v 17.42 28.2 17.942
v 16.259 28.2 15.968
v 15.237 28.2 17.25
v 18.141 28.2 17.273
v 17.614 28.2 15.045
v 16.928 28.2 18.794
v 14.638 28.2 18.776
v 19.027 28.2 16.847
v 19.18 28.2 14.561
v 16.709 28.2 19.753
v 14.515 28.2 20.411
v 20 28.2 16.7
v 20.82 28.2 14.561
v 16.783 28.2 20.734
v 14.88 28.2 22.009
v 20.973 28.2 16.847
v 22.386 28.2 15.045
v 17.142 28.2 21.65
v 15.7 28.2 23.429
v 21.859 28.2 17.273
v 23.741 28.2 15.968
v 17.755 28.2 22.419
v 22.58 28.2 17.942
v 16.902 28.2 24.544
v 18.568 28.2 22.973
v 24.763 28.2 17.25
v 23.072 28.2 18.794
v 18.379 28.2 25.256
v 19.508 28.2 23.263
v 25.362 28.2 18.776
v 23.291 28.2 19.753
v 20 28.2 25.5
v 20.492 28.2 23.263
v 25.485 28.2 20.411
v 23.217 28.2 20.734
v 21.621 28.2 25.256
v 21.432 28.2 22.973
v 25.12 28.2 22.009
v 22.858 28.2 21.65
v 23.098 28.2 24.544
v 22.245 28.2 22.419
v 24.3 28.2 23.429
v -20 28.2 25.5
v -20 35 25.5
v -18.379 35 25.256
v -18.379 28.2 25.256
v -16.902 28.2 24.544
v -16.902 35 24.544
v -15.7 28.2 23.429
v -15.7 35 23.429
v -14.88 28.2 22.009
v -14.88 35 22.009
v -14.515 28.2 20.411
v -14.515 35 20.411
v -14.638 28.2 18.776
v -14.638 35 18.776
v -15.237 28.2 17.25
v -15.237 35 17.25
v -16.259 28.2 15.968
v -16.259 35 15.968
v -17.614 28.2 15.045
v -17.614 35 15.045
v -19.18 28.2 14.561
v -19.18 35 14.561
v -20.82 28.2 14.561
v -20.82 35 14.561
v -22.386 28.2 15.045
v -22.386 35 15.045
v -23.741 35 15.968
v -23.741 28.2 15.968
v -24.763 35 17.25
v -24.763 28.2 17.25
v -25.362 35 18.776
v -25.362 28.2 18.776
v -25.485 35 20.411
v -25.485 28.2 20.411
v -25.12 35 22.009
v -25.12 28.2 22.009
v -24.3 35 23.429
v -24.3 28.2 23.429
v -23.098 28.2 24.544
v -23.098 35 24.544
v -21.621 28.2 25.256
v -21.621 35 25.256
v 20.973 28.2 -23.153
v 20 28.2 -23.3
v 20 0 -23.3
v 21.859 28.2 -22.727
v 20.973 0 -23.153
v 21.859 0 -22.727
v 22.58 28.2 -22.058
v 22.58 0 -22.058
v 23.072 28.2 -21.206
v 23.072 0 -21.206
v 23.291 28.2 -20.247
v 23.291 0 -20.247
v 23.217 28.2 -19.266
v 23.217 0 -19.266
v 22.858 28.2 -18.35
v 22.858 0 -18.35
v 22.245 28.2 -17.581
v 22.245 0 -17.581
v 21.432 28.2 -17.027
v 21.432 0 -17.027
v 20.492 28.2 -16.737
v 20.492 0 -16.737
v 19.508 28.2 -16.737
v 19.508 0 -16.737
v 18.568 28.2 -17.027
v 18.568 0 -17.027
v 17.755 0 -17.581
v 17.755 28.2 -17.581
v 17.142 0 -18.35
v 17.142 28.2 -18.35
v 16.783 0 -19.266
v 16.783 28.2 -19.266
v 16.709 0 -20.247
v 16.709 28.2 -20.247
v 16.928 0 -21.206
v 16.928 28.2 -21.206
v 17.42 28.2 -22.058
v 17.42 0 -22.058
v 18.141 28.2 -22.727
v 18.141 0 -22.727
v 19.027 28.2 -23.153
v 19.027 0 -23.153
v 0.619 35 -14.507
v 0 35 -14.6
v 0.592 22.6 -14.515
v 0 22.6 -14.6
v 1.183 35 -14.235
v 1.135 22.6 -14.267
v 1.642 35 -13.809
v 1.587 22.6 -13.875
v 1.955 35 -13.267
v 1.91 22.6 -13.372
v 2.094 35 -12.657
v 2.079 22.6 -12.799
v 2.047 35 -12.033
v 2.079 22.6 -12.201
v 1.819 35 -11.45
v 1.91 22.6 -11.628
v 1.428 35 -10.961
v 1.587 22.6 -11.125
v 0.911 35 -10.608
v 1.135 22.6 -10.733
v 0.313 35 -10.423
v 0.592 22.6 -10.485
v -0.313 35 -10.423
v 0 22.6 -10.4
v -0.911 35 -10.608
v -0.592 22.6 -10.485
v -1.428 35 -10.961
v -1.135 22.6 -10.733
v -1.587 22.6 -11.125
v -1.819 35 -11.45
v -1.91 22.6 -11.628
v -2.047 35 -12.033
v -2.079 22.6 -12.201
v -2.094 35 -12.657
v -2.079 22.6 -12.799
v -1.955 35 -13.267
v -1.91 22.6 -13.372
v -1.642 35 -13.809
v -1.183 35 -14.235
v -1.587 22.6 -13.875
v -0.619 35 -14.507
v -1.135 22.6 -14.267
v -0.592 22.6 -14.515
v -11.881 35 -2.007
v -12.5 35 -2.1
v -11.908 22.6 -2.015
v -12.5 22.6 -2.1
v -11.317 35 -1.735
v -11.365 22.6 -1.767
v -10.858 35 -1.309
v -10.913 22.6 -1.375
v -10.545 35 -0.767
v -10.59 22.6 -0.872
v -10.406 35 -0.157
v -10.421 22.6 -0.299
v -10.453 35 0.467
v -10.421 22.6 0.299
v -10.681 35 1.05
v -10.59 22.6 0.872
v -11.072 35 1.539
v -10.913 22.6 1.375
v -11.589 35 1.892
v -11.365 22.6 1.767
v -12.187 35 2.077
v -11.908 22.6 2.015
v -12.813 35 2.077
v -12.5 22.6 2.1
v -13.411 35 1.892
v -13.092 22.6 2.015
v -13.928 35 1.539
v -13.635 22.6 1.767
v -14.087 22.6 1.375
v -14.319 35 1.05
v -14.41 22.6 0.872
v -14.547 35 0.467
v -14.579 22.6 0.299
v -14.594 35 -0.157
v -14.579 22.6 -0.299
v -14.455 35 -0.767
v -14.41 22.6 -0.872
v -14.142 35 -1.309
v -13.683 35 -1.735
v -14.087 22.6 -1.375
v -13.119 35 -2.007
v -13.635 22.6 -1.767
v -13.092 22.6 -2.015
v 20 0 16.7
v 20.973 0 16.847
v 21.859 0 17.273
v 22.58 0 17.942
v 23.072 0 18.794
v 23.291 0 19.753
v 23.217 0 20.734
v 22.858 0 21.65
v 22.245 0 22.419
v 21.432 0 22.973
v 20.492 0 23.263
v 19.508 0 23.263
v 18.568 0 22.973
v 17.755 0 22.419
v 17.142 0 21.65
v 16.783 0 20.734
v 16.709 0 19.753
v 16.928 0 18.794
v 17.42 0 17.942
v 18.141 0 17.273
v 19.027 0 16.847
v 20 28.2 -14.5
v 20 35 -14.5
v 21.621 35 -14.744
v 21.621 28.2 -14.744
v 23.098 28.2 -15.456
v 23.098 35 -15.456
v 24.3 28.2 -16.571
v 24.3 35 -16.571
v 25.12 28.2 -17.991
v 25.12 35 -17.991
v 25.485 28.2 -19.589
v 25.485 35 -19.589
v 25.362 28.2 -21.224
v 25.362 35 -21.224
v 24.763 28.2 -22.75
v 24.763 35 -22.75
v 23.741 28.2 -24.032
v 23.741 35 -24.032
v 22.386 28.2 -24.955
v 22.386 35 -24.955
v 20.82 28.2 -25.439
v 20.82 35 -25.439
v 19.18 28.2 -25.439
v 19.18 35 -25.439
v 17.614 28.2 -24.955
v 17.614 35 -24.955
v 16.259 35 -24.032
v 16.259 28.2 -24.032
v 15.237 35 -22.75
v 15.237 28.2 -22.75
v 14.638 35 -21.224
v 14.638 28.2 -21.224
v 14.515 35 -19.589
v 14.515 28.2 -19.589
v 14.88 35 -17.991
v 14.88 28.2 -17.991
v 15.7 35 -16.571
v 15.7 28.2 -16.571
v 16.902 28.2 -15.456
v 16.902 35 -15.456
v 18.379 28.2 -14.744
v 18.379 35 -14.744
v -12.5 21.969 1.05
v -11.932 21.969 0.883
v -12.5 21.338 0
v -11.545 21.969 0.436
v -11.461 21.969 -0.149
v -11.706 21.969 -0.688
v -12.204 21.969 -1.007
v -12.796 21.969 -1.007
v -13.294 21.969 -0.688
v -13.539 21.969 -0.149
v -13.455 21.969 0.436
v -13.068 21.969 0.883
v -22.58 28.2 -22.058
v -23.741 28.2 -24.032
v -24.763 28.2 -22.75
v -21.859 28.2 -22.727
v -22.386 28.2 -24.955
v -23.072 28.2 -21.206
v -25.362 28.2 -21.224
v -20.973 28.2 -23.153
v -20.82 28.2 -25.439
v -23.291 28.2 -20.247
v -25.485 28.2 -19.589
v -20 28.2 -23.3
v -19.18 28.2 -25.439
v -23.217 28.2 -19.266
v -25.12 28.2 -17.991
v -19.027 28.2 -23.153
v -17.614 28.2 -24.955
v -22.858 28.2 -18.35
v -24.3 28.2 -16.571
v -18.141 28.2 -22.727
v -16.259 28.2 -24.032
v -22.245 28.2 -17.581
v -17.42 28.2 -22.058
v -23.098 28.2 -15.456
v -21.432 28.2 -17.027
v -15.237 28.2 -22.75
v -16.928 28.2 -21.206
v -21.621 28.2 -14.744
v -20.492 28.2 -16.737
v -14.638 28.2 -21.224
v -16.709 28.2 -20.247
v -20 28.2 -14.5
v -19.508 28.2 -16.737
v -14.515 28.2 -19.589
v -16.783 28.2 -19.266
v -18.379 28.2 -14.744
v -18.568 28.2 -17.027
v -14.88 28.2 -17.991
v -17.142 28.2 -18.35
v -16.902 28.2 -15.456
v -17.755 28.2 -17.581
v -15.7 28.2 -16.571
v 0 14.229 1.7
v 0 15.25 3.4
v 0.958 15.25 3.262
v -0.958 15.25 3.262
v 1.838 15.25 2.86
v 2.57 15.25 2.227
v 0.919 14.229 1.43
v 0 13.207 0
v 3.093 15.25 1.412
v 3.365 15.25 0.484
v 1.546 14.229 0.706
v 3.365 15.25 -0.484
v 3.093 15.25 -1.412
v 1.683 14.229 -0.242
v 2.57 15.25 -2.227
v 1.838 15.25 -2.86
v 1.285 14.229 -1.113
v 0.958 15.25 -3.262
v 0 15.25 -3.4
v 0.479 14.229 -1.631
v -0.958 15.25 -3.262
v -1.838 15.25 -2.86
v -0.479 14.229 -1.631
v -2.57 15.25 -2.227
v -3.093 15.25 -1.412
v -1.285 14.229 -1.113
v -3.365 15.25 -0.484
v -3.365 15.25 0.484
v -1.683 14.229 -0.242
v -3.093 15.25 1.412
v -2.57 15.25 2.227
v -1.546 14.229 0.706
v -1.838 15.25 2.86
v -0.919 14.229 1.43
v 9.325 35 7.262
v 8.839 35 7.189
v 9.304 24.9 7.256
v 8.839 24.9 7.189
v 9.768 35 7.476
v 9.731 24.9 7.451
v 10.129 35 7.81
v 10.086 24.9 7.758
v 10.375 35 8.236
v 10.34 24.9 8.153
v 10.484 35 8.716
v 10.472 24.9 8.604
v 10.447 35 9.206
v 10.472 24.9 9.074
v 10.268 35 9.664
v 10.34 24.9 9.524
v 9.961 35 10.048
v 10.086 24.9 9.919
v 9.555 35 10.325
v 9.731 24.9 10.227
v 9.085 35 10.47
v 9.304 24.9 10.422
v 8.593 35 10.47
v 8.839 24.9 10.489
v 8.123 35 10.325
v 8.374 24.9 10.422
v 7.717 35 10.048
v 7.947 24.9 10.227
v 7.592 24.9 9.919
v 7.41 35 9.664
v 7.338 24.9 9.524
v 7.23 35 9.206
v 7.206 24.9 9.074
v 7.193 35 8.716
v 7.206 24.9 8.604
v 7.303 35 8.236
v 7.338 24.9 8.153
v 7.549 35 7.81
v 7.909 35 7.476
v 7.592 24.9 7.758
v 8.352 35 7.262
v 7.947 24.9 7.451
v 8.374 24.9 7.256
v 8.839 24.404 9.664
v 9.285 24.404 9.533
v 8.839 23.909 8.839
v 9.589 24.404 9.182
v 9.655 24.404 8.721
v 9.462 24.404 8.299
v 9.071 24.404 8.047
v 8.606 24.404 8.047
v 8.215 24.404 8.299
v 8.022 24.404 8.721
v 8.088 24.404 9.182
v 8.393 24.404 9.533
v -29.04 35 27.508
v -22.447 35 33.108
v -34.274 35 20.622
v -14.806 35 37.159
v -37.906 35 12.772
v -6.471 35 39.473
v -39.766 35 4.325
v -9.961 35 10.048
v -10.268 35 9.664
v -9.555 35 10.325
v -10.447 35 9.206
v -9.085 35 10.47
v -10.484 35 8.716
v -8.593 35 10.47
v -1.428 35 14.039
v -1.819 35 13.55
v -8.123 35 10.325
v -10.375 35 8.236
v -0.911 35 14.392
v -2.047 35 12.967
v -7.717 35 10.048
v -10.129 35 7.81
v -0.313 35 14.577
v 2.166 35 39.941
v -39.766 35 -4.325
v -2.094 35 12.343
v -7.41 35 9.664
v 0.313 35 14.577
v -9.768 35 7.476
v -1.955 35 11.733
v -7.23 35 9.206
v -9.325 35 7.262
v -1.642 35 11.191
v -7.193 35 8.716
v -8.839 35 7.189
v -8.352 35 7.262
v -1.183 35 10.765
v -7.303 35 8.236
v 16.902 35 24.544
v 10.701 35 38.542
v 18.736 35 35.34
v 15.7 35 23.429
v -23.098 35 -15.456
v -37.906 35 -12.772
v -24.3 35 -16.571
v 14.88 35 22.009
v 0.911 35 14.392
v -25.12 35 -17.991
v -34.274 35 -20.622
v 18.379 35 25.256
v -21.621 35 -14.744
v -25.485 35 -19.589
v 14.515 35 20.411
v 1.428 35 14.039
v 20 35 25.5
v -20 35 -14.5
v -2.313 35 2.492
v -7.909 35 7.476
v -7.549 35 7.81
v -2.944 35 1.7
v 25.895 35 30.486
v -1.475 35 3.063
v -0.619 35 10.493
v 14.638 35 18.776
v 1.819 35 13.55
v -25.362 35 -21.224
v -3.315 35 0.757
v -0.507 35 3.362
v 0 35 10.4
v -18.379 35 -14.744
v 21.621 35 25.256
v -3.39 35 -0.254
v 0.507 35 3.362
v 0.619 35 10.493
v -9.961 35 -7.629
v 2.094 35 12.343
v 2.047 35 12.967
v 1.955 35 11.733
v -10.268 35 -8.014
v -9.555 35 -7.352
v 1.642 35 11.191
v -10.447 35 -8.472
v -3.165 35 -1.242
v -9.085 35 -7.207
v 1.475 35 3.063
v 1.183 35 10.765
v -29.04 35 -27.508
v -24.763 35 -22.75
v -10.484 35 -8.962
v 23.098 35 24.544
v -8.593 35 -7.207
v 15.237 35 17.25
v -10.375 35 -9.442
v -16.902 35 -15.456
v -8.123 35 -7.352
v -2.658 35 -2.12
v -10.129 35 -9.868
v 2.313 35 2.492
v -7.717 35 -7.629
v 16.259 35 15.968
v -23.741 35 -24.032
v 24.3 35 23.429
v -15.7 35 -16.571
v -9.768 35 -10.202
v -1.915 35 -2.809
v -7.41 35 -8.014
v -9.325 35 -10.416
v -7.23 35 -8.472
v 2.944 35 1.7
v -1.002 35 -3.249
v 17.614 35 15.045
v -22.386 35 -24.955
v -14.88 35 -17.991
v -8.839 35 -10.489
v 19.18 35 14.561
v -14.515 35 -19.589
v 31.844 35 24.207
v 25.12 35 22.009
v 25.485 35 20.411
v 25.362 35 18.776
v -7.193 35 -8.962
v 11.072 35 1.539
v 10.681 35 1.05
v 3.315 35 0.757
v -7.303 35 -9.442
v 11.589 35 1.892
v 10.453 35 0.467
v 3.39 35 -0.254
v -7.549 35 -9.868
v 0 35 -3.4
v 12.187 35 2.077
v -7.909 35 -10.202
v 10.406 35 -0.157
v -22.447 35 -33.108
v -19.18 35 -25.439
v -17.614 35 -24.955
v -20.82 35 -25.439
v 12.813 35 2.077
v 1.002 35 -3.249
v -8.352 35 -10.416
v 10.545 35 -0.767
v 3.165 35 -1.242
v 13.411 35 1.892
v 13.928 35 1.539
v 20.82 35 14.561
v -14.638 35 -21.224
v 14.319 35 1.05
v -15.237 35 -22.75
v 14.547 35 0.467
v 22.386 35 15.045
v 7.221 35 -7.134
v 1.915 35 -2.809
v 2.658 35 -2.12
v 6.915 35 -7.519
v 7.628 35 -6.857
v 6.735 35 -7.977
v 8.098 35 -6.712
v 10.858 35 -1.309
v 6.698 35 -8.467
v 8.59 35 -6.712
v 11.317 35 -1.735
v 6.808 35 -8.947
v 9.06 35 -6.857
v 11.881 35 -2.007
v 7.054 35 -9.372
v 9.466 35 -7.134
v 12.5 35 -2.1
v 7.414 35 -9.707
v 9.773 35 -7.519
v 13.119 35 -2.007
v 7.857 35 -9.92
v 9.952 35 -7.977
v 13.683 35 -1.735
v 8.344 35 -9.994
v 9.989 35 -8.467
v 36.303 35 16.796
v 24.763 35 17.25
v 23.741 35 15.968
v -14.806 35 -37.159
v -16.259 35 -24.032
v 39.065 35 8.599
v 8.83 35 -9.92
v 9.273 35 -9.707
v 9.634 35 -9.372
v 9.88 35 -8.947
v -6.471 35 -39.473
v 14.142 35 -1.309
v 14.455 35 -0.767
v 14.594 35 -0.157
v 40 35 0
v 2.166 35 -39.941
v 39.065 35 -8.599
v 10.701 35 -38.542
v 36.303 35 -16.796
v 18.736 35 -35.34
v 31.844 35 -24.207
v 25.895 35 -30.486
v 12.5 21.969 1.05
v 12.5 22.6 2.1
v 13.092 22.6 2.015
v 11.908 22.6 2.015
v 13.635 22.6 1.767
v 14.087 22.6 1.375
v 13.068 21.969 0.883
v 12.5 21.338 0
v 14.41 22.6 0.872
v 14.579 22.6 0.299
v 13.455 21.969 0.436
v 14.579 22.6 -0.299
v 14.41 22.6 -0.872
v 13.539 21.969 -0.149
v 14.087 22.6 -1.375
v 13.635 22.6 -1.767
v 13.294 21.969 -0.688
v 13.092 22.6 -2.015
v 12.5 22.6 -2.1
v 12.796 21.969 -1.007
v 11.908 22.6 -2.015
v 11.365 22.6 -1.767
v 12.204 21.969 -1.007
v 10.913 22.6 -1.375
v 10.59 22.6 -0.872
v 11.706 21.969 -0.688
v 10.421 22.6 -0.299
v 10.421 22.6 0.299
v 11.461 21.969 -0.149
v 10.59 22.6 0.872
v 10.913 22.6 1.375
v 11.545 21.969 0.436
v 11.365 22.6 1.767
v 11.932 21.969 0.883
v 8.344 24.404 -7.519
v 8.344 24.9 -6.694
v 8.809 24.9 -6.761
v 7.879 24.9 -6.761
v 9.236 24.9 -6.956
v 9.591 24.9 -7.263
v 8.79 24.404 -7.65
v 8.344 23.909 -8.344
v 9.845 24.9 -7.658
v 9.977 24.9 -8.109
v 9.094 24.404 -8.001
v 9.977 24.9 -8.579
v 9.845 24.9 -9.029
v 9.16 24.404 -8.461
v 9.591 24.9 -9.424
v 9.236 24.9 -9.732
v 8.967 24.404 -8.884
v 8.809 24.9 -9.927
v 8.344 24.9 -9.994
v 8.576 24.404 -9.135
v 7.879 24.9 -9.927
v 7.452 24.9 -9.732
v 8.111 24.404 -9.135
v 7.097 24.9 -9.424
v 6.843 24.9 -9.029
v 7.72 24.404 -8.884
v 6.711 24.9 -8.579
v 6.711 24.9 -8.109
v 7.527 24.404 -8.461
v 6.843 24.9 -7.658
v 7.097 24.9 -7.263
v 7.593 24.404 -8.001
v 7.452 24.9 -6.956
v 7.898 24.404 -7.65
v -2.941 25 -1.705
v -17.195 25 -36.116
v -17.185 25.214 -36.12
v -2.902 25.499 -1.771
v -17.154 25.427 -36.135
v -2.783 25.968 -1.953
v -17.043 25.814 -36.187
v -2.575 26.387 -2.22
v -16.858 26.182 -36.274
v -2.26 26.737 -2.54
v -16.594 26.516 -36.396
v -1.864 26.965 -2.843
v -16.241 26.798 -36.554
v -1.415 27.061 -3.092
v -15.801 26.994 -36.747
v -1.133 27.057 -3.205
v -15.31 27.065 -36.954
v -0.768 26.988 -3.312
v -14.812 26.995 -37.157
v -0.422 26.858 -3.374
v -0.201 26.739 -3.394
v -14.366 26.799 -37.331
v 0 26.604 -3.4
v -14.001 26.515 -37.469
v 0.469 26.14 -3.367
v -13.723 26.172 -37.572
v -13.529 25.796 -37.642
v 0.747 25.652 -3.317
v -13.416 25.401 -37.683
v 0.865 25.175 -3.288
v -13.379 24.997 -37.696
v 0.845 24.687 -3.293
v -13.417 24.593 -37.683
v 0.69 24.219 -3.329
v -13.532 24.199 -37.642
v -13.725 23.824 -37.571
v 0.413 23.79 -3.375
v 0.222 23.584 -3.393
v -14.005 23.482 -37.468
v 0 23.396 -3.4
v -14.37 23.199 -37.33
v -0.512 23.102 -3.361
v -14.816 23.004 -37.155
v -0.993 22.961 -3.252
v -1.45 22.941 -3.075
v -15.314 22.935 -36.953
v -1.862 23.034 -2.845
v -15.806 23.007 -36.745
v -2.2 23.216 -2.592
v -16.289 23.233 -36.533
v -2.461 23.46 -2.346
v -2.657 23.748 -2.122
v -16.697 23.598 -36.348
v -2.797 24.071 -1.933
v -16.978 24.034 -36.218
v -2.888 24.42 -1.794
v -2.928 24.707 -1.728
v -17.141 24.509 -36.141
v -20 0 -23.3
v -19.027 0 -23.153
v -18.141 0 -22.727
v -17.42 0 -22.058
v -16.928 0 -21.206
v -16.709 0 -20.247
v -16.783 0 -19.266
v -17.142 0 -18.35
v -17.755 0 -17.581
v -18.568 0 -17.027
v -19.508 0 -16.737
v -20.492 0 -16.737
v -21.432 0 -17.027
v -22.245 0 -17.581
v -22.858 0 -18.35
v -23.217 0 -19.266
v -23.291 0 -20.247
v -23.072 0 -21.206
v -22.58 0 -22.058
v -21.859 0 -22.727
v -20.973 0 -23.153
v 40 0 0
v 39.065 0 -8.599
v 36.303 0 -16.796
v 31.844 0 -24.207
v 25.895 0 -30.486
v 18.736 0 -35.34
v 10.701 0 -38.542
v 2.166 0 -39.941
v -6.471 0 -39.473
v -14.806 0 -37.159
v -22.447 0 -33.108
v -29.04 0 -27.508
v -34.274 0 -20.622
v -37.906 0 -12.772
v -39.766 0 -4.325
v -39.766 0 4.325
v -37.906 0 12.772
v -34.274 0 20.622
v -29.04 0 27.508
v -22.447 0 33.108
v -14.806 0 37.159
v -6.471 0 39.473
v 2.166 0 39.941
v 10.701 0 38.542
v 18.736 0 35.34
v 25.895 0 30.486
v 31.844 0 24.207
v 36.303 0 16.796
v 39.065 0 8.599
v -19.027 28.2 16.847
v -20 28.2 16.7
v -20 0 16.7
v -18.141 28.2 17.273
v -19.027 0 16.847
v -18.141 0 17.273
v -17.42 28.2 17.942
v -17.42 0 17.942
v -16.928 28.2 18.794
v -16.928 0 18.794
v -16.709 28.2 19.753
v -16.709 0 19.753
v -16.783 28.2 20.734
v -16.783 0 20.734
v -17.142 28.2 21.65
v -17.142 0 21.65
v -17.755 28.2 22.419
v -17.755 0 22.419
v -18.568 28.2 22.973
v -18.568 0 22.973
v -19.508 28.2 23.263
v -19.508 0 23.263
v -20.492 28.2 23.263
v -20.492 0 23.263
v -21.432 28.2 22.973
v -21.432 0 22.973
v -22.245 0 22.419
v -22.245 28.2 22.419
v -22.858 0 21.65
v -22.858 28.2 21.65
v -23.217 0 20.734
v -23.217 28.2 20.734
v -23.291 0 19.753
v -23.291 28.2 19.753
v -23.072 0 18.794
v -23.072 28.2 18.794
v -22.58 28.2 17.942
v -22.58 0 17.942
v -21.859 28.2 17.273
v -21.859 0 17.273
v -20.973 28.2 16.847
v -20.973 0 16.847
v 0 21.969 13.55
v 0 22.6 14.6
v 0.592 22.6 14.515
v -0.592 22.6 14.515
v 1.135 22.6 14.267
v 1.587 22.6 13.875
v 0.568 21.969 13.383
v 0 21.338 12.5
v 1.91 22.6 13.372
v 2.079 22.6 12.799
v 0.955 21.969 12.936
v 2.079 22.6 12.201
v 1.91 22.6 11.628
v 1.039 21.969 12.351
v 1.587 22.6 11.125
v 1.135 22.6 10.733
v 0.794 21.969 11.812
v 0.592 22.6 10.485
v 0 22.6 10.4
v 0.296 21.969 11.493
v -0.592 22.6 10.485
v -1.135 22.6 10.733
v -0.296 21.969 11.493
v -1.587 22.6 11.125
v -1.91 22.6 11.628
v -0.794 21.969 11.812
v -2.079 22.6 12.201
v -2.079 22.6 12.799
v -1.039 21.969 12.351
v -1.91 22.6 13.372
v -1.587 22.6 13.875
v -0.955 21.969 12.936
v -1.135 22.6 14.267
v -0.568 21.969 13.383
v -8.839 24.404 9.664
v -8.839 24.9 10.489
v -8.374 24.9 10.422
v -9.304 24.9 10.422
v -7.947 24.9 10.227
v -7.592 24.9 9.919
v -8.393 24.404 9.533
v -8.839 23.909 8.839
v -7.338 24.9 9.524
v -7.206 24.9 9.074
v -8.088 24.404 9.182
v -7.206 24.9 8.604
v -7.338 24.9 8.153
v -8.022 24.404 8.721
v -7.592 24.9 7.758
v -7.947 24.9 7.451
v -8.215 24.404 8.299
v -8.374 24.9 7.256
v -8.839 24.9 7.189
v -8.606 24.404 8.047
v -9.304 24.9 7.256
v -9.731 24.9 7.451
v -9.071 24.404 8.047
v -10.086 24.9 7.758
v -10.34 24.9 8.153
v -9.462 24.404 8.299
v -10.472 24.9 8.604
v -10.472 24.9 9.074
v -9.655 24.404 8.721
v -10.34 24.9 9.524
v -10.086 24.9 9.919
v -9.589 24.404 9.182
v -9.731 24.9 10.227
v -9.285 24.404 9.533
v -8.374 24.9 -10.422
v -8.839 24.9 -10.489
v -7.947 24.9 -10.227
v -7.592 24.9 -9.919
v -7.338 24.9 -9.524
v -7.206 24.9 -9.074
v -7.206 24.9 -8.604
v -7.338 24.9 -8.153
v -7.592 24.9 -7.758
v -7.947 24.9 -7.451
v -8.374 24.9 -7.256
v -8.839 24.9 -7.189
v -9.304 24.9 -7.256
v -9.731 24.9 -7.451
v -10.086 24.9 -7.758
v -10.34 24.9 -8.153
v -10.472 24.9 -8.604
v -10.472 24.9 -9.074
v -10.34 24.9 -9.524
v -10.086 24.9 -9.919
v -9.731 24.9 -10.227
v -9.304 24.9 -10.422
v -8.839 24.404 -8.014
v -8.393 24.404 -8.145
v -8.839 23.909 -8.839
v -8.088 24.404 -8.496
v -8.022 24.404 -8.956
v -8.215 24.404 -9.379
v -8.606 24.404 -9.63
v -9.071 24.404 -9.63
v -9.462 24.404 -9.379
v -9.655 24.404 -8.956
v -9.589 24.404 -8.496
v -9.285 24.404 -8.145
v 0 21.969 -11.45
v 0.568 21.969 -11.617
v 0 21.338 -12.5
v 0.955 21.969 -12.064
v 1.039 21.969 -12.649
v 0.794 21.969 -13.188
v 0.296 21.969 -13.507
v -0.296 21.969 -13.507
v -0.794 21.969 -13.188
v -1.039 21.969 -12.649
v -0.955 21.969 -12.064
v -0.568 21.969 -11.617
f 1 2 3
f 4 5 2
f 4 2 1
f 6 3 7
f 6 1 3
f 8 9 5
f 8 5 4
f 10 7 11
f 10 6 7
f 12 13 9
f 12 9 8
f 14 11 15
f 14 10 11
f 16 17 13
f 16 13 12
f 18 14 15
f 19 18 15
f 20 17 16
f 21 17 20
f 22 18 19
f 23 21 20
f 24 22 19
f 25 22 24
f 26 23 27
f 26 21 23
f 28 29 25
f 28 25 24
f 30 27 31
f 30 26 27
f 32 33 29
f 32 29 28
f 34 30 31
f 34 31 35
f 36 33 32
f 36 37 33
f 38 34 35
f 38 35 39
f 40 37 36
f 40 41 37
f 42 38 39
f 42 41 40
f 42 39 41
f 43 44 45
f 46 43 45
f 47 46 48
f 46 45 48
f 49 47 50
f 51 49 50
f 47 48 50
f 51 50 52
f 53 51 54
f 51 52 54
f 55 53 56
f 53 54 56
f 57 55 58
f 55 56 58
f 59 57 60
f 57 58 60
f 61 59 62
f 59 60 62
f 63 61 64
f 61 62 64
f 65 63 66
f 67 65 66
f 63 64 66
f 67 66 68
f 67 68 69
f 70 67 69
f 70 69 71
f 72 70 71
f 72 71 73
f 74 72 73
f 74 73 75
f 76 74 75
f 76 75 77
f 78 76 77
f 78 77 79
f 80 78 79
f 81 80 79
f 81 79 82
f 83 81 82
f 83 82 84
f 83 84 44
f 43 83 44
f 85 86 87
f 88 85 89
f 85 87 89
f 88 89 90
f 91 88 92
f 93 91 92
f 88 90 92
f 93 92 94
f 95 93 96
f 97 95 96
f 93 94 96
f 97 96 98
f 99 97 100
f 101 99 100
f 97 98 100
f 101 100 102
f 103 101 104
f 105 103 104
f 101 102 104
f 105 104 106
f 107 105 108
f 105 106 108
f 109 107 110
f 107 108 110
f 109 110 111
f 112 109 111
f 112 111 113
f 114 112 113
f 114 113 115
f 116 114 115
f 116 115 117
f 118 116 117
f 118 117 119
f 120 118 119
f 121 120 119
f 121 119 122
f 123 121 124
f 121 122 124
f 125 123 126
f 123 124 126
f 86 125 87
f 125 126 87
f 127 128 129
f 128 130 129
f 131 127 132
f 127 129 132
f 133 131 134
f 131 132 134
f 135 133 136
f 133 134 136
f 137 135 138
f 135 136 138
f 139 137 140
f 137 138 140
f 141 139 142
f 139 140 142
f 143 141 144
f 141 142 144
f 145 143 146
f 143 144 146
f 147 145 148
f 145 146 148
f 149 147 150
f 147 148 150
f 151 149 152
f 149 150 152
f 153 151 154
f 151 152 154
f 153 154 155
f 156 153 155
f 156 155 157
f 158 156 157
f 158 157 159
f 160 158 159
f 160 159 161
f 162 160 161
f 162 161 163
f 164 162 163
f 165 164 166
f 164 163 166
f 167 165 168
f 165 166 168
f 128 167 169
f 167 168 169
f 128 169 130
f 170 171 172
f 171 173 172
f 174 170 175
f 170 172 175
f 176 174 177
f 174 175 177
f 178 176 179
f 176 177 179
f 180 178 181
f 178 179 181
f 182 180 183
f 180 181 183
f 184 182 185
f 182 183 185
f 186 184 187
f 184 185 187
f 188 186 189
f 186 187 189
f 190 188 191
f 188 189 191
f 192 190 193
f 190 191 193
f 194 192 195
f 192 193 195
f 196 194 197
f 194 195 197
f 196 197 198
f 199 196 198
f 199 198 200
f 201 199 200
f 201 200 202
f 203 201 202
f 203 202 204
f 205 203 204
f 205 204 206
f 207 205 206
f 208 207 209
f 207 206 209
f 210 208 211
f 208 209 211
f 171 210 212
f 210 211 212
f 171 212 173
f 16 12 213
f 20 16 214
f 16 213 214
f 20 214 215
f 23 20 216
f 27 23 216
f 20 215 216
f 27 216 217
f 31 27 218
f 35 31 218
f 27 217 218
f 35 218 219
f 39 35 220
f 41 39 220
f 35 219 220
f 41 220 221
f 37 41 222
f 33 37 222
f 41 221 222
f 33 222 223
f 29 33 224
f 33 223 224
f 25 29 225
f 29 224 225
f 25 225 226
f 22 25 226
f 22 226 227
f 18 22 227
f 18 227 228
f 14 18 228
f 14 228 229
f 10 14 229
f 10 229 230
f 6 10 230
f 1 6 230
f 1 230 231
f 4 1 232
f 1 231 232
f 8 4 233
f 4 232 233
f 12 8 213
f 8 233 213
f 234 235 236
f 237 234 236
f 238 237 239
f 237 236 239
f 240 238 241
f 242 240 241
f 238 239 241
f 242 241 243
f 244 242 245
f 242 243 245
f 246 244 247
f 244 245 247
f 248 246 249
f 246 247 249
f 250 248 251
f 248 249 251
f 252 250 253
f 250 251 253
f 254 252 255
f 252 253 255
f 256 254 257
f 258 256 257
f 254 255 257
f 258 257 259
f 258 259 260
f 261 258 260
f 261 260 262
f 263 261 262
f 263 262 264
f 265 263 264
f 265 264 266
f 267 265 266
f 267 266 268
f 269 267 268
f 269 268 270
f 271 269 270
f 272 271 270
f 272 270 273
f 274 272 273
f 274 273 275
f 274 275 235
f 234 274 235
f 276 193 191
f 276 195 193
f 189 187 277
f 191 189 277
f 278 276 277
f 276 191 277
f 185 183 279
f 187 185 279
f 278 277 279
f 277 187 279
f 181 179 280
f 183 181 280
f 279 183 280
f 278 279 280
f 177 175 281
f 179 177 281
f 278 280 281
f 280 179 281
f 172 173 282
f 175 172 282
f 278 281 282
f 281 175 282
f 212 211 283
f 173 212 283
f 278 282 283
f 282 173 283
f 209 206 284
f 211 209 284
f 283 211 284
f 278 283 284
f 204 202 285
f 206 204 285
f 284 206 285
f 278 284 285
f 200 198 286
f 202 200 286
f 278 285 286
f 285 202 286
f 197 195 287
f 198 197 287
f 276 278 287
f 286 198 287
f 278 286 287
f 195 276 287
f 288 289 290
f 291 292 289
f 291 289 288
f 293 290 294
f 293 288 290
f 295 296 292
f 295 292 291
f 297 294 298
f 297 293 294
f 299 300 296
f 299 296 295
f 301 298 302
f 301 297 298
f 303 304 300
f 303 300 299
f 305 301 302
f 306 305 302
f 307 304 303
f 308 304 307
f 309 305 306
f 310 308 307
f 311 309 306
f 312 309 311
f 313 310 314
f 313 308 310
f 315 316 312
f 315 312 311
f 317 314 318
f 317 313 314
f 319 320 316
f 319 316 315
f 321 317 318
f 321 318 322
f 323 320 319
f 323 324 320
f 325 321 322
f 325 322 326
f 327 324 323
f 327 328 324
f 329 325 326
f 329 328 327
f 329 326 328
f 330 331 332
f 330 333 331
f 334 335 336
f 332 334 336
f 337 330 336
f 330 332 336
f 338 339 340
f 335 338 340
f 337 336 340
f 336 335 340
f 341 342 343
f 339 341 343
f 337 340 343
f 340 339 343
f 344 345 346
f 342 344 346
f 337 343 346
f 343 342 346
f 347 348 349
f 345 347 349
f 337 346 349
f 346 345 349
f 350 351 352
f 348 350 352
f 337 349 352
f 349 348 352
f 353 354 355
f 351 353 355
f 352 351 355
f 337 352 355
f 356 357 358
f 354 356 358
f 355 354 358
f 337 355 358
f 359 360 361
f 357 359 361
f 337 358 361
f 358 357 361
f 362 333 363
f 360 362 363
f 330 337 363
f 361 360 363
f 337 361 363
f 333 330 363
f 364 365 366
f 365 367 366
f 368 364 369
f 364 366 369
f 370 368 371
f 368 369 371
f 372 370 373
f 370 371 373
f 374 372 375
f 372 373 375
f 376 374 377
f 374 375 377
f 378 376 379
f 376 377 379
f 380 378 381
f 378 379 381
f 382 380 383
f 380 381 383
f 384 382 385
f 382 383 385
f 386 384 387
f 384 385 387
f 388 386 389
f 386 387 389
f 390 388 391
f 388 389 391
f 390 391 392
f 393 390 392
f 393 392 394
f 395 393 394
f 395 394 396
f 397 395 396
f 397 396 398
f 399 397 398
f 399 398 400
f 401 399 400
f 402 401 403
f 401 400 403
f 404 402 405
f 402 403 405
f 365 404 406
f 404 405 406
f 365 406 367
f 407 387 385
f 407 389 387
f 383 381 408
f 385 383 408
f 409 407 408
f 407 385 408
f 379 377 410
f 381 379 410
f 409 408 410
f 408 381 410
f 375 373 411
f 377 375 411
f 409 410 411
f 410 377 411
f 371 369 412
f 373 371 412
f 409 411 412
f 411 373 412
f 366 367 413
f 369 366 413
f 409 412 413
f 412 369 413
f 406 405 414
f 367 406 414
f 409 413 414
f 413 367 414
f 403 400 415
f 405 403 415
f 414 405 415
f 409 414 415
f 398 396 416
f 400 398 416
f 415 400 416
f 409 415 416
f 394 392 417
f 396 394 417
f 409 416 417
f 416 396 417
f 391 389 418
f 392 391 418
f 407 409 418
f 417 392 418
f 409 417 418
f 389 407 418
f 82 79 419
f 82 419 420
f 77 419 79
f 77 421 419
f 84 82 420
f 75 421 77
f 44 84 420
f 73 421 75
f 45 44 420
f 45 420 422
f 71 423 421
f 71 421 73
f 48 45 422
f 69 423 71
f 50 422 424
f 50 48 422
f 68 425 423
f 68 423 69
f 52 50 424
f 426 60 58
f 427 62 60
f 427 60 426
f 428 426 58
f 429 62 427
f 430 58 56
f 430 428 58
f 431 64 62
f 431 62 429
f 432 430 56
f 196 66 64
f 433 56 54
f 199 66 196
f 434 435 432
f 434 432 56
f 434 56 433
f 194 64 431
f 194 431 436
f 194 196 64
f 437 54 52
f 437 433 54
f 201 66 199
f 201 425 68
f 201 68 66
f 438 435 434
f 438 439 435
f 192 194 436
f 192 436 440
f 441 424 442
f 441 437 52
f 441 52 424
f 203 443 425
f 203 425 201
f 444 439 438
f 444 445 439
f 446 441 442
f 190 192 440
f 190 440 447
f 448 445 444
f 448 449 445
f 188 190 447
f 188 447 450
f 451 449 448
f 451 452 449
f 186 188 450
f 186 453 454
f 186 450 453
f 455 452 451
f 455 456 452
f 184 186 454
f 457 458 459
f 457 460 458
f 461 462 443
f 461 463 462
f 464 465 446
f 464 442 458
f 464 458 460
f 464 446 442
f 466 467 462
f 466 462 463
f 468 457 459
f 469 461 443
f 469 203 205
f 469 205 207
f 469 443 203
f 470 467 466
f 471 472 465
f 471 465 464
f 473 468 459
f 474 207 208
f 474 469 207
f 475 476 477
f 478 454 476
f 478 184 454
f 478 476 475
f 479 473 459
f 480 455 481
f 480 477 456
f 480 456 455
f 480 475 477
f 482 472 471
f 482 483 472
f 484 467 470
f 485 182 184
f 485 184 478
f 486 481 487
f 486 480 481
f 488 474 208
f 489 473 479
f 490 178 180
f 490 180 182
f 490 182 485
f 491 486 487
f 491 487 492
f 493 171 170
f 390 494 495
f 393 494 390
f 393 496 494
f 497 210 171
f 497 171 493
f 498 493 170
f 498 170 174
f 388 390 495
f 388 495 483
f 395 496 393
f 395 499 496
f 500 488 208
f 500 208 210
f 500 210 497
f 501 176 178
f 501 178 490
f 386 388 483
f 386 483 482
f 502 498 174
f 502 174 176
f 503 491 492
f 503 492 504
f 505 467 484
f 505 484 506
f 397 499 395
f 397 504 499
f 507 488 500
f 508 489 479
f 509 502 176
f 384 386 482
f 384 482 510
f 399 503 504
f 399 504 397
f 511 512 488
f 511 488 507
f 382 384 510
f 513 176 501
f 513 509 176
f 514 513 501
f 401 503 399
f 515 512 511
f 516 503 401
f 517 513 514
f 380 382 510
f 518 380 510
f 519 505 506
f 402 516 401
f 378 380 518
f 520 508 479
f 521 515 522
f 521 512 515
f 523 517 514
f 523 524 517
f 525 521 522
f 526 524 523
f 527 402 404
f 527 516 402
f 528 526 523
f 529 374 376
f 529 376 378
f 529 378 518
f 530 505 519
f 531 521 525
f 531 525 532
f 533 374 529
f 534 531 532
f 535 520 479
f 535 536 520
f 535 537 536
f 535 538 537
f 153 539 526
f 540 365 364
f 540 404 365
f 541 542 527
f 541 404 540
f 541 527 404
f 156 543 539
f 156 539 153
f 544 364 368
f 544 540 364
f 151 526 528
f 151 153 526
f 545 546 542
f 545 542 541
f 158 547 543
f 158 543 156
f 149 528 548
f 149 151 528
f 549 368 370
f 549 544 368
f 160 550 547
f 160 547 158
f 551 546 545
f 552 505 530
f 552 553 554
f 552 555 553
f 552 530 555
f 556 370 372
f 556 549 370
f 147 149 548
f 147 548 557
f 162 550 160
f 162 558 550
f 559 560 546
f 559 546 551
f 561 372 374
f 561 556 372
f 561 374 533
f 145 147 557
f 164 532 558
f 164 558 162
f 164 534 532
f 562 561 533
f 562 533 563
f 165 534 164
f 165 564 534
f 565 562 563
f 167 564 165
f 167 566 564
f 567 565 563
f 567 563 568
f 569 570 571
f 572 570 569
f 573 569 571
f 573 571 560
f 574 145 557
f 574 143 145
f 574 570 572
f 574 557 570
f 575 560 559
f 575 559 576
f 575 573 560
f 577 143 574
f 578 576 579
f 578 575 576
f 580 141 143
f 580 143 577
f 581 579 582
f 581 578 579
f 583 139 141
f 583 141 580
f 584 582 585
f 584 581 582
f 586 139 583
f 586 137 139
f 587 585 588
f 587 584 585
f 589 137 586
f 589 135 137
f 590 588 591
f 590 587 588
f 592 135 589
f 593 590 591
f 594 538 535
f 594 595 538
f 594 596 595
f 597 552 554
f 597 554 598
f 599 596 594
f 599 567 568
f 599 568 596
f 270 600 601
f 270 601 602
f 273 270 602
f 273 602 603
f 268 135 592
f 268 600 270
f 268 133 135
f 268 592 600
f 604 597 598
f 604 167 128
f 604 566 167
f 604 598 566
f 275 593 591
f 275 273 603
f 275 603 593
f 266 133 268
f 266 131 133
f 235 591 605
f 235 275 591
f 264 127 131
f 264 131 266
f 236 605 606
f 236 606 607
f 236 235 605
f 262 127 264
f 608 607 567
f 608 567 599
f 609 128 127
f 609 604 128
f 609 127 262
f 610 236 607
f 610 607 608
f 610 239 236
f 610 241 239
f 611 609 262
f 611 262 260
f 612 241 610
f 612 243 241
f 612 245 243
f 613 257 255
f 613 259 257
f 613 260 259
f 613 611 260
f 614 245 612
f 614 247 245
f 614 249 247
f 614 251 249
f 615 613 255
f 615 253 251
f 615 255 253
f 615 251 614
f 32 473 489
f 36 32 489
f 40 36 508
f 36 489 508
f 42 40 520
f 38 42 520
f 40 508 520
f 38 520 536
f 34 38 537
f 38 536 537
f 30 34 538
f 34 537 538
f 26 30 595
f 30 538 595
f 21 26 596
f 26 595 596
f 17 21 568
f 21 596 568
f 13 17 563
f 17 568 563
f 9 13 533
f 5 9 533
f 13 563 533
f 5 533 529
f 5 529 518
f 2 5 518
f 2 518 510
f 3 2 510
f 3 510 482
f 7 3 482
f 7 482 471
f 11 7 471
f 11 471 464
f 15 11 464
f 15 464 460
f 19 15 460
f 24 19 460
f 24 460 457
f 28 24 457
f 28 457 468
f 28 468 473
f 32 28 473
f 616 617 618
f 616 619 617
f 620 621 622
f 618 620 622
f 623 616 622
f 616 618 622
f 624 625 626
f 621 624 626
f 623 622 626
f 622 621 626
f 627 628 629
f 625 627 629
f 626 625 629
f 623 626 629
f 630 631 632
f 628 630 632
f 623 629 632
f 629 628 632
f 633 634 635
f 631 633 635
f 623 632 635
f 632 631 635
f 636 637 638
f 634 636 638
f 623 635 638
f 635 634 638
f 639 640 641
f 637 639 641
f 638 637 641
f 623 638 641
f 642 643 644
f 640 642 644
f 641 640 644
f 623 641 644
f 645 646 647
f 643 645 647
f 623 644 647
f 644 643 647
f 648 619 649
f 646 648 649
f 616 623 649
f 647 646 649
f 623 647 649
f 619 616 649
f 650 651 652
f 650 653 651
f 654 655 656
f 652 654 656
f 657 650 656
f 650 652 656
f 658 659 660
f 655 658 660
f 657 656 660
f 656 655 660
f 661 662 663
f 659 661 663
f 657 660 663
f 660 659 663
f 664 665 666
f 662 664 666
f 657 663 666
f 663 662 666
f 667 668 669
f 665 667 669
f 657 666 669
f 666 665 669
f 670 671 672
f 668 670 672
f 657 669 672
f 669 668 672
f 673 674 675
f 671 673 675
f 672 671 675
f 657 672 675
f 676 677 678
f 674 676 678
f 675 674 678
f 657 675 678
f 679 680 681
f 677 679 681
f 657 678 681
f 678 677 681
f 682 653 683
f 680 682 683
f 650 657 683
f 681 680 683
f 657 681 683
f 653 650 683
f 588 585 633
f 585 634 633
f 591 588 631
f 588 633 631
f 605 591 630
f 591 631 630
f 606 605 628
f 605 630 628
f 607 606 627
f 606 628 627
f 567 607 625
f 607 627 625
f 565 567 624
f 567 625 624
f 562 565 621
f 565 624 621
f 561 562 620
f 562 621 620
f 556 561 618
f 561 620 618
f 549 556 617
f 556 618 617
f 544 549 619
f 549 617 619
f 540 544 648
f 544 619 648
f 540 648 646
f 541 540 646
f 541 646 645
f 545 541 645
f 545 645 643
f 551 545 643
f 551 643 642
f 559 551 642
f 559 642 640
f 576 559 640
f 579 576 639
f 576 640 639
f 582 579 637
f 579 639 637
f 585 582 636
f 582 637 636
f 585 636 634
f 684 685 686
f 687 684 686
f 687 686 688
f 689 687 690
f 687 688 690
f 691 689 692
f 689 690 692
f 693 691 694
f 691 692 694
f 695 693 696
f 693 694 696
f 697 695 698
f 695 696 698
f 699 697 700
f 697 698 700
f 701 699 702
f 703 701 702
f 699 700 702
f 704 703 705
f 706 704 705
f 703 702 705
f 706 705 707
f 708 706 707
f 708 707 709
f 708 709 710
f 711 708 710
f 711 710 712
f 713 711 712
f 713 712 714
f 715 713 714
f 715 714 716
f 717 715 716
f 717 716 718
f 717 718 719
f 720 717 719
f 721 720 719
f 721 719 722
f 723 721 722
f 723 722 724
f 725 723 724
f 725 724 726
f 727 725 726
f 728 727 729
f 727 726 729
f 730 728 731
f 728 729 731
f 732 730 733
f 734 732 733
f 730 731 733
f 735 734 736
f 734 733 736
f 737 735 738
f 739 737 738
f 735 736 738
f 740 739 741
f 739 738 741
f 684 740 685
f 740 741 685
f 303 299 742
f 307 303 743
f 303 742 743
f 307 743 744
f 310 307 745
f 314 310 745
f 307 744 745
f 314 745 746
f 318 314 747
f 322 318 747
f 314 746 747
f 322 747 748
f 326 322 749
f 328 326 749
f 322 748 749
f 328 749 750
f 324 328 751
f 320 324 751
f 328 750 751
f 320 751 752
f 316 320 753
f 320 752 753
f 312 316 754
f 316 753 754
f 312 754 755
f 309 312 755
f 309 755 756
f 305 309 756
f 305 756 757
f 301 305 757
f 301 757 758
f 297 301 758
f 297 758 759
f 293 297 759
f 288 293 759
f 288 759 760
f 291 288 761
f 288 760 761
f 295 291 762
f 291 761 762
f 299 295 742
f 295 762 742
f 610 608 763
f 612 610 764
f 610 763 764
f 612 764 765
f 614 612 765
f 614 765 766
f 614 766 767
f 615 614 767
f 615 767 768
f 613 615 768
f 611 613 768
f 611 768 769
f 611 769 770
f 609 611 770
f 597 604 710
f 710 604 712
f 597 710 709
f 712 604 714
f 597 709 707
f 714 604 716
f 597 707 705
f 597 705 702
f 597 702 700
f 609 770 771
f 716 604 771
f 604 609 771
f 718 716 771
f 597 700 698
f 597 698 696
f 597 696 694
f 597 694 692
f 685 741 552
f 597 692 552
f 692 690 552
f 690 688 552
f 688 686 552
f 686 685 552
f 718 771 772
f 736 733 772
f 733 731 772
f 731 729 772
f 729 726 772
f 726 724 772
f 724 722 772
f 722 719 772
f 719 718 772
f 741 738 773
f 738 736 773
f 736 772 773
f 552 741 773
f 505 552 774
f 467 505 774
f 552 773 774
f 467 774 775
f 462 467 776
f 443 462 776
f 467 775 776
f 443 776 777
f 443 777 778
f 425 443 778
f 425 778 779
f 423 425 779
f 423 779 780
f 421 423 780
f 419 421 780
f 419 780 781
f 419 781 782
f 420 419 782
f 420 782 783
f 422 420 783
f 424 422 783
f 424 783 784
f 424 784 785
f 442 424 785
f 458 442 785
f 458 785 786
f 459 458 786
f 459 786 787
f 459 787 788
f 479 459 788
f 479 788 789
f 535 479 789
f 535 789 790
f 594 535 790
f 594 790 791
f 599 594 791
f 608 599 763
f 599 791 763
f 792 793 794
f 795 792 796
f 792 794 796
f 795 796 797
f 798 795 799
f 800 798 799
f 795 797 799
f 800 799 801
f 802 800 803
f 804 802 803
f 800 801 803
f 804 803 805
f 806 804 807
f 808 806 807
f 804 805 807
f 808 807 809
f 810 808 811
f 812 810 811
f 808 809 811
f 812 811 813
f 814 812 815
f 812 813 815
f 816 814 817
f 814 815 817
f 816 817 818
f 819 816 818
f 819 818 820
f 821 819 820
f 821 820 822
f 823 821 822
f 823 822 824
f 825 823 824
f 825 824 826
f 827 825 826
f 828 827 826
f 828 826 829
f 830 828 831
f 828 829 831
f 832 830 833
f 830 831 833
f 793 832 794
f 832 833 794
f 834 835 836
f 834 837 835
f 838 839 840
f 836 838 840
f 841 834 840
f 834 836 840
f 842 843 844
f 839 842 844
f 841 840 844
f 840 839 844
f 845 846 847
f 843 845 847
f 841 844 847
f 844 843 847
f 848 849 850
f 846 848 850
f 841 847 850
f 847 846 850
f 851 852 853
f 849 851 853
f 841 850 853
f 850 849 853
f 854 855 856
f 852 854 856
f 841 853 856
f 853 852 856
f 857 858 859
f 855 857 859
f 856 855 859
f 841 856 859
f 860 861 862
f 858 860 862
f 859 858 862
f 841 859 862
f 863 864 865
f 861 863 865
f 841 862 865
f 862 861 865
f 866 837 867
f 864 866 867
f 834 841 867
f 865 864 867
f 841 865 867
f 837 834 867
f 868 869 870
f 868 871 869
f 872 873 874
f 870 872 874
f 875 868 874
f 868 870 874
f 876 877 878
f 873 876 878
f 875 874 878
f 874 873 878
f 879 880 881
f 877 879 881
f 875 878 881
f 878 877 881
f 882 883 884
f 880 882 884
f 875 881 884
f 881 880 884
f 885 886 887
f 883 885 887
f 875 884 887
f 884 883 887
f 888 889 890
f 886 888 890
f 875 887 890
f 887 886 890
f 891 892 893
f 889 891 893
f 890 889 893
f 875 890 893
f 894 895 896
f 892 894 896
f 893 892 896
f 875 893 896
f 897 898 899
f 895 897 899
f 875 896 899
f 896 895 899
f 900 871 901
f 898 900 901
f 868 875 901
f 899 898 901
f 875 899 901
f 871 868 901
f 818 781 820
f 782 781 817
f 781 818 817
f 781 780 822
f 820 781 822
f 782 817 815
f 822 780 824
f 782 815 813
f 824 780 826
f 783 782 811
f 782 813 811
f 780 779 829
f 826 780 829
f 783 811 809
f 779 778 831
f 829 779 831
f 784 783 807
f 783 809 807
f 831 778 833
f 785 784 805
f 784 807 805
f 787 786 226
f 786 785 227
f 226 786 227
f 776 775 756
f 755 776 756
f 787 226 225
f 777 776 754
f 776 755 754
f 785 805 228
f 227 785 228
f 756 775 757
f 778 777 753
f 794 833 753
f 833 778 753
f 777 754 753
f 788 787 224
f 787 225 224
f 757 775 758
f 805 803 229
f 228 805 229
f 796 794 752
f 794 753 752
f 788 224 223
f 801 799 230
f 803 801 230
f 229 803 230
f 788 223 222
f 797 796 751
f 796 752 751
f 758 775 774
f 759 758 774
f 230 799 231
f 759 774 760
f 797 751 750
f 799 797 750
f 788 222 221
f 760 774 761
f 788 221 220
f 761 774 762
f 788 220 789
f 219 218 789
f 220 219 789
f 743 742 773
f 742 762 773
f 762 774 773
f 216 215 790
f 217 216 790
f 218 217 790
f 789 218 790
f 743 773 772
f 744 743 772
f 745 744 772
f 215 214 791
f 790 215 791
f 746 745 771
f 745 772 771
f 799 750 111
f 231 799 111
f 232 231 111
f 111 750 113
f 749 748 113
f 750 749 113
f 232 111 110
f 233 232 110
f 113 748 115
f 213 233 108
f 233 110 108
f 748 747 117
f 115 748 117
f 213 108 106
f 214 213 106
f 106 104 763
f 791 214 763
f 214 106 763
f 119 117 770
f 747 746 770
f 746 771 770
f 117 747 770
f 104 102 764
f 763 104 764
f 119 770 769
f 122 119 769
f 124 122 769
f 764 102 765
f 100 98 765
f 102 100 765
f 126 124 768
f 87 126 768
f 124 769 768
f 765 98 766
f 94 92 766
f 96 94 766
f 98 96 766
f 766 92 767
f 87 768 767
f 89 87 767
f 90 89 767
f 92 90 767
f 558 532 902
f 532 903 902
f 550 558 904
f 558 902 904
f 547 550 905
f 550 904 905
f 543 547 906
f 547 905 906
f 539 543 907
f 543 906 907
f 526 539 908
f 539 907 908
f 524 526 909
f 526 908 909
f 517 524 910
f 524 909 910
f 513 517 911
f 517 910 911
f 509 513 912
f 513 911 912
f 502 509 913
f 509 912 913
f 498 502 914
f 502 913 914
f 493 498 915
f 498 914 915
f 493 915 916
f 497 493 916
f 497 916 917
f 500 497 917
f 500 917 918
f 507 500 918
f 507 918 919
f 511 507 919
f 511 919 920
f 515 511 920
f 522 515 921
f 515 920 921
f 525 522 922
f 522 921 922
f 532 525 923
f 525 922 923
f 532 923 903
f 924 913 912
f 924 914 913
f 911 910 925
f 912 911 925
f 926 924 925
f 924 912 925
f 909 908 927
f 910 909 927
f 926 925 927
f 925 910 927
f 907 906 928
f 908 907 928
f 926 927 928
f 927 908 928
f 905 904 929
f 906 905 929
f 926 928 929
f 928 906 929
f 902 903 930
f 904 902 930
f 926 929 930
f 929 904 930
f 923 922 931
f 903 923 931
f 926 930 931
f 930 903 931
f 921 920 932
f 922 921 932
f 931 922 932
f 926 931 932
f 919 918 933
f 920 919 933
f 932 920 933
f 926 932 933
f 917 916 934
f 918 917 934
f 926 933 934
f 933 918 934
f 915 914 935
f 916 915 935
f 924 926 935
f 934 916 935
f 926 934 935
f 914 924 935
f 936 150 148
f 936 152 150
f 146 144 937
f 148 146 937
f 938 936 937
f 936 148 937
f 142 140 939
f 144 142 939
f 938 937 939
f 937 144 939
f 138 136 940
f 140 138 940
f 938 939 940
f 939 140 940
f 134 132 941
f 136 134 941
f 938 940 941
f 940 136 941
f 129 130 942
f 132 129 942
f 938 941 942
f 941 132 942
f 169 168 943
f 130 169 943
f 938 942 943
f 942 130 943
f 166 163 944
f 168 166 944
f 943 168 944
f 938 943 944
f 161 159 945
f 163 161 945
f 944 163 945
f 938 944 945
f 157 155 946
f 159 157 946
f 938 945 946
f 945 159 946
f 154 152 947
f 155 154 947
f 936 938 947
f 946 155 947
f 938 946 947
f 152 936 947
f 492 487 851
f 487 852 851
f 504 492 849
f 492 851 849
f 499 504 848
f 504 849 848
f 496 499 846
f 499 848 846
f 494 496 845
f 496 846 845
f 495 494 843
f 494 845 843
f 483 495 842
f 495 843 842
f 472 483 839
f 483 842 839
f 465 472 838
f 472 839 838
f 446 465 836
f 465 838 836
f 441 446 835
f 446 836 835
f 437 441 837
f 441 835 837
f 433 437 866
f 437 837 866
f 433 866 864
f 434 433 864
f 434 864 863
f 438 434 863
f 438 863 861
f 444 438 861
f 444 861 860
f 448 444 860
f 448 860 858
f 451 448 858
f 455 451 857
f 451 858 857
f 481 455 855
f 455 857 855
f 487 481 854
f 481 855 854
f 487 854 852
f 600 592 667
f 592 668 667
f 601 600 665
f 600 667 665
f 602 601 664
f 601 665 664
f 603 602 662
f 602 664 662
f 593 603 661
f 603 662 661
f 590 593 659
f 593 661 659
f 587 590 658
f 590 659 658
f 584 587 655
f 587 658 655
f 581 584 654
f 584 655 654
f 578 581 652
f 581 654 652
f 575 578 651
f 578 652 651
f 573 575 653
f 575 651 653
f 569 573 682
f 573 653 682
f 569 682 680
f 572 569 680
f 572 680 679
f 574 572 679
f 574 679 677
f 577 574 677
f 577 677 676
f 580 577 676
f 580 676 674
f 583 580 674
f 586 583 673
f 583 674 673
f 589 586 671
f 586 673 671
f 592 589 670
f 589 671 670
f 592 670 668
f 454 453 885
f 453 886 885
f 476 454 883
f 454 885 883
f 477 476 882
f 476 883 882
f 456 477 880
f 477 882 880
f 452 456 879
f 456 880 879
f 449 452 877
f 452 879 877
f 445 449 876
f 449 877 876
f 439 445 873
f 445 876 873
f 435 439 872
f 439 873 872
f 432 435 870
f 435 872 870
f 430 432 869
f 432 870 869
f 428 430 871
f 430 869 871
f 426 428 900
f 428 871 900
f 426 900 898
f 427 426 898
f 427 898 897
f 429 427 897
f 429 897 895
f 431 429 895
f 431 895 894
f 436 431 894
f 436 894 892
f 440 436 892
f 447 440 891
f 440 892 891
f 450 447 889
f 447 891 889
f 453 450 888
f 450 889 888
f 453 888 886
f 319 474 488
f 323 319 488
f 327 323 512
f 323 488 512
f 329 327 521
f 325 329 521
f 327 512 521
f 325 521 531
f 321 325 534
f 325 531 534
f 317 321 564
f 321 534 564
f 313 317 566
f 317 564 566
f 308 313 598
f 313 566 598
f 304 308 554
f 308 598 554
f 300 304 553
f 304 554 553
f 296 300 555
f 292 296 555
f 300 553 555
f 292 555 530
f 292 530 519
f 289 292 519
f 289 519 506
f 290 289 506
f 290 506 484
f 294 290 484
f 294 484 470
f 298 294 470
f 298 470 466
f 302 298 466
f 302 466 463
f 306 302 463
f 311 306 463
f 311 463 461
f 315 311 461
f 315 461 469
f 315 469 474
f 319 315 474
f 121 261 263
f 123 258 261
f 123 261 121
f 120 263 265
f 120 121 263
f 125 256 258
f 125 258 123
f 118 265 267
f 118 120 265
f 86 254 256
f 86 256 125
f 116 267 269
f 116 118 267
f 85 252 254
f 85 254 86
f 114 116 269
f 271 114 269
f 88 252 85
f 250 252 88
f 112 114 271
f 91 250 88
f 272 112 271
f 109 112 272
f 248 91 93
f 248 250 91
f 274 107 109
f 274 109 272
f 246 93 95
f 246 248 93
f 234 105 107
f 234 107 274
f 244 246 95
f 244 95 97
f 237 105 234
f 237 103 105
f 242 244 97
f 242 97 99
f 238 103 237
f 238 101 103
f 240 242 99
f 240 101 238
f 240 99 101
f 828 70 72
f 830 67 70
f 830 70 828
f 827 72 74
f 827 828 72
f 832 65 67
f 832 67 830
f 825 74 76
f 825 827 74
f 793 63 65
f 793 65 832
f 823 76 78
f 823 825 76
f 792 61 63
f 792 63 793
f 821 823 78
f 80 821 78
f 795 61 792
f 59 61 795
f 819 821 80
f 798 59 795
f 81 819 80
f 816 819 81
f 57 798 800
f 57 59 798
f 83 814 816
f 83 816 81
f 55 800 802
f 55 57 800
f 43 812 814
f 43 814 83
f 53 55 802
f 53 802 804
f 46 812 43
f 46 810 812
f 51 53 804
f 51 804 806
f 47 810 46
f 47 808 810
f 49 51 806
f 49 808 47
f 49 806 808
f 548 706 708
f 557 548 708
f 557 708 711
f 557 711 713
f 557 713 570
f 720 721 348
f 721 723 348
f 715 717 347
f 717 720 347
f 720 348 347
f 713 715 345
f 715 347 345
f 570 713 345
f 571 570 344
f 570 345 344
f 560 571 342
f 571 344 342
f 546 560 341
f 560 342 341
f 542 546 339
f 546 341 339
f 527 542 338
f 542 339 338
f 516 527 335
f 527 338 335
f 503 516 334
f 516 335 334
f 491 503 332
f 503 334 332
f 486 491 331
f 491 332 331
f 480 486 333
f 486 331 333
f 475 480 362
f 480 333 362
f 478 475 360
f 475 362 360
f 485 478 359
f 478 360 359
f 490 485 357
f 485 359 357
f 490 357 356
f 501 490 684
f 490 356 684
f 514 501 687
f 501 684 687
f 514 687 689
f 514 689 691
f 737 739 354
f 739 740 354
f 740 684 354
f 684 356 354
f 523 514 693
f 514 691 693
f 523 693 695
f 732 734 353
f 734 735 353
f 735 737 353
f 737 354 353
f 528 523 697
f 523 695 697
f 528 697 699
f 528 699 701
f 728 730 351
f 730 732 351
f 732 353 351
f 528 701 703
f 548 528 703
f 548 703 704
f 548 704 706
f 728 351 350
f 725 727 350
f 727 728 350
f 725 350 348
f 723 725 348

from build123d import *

# Parameters (mm, degrees)
SKETCH_1_R                = 40
EXTRUDE_1_DEPTH           = 35
HOLE_WIZARD_1_D           = 6.6
HOLE_WIZARD_1_DEPTH       = 50
HOLE_WIZARD_1_CBORE_D     = 11
HOLE_WIZARD_1_CBORE_DEPTH = 6.8
HOLE_WIZARD_1_TIP         = 1.982840043
HOLE_WIZARD_M5_1_D        = 4.2
HOLE_WIZARD_M5_1_DEPTH    = 12.4
HOLE_WIZARD_M5_1_TIP      = 1.2618073
HOLE_WIZARD_M4_1_D        = 3.3
HOLE_WIZARD_M4_1_DEPTH    = 10.1
HOLE_WIZARD_M4_1_TIP      = 0.991420021
HOLE_WIZARD_M8_1_D        = 6.8
HOLE_WIZARD_M8_1_DEPTH    = 19.75
HOLE_WIZARD_M8_1_TIP      = 2.042926105
SKETCH_7_R                = 2.065
CUT_EXTRUDE_1_DEPTH       = 40


with BuildPart() as part:
    # 草图1 → 凸台-拉伸1 (new body)
    with BuildSketch(Plane(origin=(0, 0, 0), x_dir=(1, 0, 0), z_dir=(0, 1, 0))):
        Circle(SKETCH_1_R)
    extrude(amount=EXTRUDE_1_DEPTH)

    # 打孔尺寸(%根据)内六角圆柱头螺钉的类型1
    with Locations(Plane(origin=(-20, 35, -20), x_dir=(0, 0, 1), z_dir=(0, 1, 0))):
        with Locations((0, 0), (0, 40), (40, 40), (40, 0)):
            CounterBoreHole(HOLE_WIZARD_1_D / 2, HOLE_WIZARD_1_CBORE_D / 2, HOLE_WIZARD_1_CBORE_DEPTH, depth=HOLE_WIZARD_1_DEPTH)
            with Locations((0, 0, -(HOLE_WIZARD_1_DEPTH + HOLE_WIZARD_1_TIP / 2))):  # 118° drill point
                Cone(0, HOLE_WIZARD_1_D / 2, HOLE_WIZARD_1_TIP, mode=Mode.SUBTRACT)

    # M5 螺纹孔1
    with Locations(Plane(origin=(0, 35, -12.5), x_dir=(0, 0, 1), z_dir=(0, 1, 0))):
        with Locations((0, 0), (25, 0), (12.5, 12.5), (12.5, -12.5)):
            Hole(HOLE_WIZARD_M5_1_D / 2, depth=HOLE_WIZARD_M5_1_DEPTH)
            with Locations((0, 0, -(HOLE_WIZARD_M5_1_DEPTH + HOLE_WIZARD_M5_1_TIP / 2))):  # 118° drill point
                Cone(0, HOLE_WIZARD_M5_1_D / 2, HOLE_WIZARD_M5_1_TIP, mode=Mode.SUBTRACT)

    # M4 螺纹孔1
    with Locations(Plane(origin=(-8.838834765, 35, -8.838834765), x_dir=(0, 0, 1), z_dir=(0, 1, 0))):
        with Locations((0, 0), (0.495114697, 17.182554833), (17.67766953, 17.67766953), (17.67766953, 0)):
            Hole(HOLE_WIZARD_M4_1_D / 2, depth=HOLE_WIZARD_M4_1_DEPTH)
            with Locations((0, 0, -(HOLE_WIZARD_M4_1_DEPTH + HOLE_WIZARD_M4_1_TIP / 2))):  # 118° drill point
                Cone(0, HOLE_WIZARD_M4_1_D / 2, HOLE_WIZARD_M4_1_TIP, mode=Mode.SUBTRACT)

    # M8 螺纹孔1
    with Locations(Plane.ZX.offset(35)):
        with Locations((0, 0)):
            Hole(HOLE_WIZARD_M8_1_D / 2, depth=HOLE_WIZARD_M8_1_DEPTH)
            with Locations((0, 0, -(HOLE_WIZARD_M8_1_DEPTH + HOLE_WIZARD_M8_1_TIP / 2))):  # 118° drill point
                Cone(0, HOLE_WIZARD_M8_1_D / 2, HOLE_WIZARD_M8_1_TIP, mode=Mode.SUBTRACT)

    # 草图7 → 切除-拉伸1 (cut)
    with BuildSketch(Plane(origin=(-15.307337295, 35, -36.9551813), x_dir=(-0.923879533, 0, 0.382683432), z_dir=(-0.382683432, 0, -0.923879533))):
        with Locations((0, -10)):
            Circle(SKETCH_7_R)
    extrude(amount=-CUT_EXTRUDE_1_DEPTH, mode=Mode.SUBTRACT)


solid = part.part
